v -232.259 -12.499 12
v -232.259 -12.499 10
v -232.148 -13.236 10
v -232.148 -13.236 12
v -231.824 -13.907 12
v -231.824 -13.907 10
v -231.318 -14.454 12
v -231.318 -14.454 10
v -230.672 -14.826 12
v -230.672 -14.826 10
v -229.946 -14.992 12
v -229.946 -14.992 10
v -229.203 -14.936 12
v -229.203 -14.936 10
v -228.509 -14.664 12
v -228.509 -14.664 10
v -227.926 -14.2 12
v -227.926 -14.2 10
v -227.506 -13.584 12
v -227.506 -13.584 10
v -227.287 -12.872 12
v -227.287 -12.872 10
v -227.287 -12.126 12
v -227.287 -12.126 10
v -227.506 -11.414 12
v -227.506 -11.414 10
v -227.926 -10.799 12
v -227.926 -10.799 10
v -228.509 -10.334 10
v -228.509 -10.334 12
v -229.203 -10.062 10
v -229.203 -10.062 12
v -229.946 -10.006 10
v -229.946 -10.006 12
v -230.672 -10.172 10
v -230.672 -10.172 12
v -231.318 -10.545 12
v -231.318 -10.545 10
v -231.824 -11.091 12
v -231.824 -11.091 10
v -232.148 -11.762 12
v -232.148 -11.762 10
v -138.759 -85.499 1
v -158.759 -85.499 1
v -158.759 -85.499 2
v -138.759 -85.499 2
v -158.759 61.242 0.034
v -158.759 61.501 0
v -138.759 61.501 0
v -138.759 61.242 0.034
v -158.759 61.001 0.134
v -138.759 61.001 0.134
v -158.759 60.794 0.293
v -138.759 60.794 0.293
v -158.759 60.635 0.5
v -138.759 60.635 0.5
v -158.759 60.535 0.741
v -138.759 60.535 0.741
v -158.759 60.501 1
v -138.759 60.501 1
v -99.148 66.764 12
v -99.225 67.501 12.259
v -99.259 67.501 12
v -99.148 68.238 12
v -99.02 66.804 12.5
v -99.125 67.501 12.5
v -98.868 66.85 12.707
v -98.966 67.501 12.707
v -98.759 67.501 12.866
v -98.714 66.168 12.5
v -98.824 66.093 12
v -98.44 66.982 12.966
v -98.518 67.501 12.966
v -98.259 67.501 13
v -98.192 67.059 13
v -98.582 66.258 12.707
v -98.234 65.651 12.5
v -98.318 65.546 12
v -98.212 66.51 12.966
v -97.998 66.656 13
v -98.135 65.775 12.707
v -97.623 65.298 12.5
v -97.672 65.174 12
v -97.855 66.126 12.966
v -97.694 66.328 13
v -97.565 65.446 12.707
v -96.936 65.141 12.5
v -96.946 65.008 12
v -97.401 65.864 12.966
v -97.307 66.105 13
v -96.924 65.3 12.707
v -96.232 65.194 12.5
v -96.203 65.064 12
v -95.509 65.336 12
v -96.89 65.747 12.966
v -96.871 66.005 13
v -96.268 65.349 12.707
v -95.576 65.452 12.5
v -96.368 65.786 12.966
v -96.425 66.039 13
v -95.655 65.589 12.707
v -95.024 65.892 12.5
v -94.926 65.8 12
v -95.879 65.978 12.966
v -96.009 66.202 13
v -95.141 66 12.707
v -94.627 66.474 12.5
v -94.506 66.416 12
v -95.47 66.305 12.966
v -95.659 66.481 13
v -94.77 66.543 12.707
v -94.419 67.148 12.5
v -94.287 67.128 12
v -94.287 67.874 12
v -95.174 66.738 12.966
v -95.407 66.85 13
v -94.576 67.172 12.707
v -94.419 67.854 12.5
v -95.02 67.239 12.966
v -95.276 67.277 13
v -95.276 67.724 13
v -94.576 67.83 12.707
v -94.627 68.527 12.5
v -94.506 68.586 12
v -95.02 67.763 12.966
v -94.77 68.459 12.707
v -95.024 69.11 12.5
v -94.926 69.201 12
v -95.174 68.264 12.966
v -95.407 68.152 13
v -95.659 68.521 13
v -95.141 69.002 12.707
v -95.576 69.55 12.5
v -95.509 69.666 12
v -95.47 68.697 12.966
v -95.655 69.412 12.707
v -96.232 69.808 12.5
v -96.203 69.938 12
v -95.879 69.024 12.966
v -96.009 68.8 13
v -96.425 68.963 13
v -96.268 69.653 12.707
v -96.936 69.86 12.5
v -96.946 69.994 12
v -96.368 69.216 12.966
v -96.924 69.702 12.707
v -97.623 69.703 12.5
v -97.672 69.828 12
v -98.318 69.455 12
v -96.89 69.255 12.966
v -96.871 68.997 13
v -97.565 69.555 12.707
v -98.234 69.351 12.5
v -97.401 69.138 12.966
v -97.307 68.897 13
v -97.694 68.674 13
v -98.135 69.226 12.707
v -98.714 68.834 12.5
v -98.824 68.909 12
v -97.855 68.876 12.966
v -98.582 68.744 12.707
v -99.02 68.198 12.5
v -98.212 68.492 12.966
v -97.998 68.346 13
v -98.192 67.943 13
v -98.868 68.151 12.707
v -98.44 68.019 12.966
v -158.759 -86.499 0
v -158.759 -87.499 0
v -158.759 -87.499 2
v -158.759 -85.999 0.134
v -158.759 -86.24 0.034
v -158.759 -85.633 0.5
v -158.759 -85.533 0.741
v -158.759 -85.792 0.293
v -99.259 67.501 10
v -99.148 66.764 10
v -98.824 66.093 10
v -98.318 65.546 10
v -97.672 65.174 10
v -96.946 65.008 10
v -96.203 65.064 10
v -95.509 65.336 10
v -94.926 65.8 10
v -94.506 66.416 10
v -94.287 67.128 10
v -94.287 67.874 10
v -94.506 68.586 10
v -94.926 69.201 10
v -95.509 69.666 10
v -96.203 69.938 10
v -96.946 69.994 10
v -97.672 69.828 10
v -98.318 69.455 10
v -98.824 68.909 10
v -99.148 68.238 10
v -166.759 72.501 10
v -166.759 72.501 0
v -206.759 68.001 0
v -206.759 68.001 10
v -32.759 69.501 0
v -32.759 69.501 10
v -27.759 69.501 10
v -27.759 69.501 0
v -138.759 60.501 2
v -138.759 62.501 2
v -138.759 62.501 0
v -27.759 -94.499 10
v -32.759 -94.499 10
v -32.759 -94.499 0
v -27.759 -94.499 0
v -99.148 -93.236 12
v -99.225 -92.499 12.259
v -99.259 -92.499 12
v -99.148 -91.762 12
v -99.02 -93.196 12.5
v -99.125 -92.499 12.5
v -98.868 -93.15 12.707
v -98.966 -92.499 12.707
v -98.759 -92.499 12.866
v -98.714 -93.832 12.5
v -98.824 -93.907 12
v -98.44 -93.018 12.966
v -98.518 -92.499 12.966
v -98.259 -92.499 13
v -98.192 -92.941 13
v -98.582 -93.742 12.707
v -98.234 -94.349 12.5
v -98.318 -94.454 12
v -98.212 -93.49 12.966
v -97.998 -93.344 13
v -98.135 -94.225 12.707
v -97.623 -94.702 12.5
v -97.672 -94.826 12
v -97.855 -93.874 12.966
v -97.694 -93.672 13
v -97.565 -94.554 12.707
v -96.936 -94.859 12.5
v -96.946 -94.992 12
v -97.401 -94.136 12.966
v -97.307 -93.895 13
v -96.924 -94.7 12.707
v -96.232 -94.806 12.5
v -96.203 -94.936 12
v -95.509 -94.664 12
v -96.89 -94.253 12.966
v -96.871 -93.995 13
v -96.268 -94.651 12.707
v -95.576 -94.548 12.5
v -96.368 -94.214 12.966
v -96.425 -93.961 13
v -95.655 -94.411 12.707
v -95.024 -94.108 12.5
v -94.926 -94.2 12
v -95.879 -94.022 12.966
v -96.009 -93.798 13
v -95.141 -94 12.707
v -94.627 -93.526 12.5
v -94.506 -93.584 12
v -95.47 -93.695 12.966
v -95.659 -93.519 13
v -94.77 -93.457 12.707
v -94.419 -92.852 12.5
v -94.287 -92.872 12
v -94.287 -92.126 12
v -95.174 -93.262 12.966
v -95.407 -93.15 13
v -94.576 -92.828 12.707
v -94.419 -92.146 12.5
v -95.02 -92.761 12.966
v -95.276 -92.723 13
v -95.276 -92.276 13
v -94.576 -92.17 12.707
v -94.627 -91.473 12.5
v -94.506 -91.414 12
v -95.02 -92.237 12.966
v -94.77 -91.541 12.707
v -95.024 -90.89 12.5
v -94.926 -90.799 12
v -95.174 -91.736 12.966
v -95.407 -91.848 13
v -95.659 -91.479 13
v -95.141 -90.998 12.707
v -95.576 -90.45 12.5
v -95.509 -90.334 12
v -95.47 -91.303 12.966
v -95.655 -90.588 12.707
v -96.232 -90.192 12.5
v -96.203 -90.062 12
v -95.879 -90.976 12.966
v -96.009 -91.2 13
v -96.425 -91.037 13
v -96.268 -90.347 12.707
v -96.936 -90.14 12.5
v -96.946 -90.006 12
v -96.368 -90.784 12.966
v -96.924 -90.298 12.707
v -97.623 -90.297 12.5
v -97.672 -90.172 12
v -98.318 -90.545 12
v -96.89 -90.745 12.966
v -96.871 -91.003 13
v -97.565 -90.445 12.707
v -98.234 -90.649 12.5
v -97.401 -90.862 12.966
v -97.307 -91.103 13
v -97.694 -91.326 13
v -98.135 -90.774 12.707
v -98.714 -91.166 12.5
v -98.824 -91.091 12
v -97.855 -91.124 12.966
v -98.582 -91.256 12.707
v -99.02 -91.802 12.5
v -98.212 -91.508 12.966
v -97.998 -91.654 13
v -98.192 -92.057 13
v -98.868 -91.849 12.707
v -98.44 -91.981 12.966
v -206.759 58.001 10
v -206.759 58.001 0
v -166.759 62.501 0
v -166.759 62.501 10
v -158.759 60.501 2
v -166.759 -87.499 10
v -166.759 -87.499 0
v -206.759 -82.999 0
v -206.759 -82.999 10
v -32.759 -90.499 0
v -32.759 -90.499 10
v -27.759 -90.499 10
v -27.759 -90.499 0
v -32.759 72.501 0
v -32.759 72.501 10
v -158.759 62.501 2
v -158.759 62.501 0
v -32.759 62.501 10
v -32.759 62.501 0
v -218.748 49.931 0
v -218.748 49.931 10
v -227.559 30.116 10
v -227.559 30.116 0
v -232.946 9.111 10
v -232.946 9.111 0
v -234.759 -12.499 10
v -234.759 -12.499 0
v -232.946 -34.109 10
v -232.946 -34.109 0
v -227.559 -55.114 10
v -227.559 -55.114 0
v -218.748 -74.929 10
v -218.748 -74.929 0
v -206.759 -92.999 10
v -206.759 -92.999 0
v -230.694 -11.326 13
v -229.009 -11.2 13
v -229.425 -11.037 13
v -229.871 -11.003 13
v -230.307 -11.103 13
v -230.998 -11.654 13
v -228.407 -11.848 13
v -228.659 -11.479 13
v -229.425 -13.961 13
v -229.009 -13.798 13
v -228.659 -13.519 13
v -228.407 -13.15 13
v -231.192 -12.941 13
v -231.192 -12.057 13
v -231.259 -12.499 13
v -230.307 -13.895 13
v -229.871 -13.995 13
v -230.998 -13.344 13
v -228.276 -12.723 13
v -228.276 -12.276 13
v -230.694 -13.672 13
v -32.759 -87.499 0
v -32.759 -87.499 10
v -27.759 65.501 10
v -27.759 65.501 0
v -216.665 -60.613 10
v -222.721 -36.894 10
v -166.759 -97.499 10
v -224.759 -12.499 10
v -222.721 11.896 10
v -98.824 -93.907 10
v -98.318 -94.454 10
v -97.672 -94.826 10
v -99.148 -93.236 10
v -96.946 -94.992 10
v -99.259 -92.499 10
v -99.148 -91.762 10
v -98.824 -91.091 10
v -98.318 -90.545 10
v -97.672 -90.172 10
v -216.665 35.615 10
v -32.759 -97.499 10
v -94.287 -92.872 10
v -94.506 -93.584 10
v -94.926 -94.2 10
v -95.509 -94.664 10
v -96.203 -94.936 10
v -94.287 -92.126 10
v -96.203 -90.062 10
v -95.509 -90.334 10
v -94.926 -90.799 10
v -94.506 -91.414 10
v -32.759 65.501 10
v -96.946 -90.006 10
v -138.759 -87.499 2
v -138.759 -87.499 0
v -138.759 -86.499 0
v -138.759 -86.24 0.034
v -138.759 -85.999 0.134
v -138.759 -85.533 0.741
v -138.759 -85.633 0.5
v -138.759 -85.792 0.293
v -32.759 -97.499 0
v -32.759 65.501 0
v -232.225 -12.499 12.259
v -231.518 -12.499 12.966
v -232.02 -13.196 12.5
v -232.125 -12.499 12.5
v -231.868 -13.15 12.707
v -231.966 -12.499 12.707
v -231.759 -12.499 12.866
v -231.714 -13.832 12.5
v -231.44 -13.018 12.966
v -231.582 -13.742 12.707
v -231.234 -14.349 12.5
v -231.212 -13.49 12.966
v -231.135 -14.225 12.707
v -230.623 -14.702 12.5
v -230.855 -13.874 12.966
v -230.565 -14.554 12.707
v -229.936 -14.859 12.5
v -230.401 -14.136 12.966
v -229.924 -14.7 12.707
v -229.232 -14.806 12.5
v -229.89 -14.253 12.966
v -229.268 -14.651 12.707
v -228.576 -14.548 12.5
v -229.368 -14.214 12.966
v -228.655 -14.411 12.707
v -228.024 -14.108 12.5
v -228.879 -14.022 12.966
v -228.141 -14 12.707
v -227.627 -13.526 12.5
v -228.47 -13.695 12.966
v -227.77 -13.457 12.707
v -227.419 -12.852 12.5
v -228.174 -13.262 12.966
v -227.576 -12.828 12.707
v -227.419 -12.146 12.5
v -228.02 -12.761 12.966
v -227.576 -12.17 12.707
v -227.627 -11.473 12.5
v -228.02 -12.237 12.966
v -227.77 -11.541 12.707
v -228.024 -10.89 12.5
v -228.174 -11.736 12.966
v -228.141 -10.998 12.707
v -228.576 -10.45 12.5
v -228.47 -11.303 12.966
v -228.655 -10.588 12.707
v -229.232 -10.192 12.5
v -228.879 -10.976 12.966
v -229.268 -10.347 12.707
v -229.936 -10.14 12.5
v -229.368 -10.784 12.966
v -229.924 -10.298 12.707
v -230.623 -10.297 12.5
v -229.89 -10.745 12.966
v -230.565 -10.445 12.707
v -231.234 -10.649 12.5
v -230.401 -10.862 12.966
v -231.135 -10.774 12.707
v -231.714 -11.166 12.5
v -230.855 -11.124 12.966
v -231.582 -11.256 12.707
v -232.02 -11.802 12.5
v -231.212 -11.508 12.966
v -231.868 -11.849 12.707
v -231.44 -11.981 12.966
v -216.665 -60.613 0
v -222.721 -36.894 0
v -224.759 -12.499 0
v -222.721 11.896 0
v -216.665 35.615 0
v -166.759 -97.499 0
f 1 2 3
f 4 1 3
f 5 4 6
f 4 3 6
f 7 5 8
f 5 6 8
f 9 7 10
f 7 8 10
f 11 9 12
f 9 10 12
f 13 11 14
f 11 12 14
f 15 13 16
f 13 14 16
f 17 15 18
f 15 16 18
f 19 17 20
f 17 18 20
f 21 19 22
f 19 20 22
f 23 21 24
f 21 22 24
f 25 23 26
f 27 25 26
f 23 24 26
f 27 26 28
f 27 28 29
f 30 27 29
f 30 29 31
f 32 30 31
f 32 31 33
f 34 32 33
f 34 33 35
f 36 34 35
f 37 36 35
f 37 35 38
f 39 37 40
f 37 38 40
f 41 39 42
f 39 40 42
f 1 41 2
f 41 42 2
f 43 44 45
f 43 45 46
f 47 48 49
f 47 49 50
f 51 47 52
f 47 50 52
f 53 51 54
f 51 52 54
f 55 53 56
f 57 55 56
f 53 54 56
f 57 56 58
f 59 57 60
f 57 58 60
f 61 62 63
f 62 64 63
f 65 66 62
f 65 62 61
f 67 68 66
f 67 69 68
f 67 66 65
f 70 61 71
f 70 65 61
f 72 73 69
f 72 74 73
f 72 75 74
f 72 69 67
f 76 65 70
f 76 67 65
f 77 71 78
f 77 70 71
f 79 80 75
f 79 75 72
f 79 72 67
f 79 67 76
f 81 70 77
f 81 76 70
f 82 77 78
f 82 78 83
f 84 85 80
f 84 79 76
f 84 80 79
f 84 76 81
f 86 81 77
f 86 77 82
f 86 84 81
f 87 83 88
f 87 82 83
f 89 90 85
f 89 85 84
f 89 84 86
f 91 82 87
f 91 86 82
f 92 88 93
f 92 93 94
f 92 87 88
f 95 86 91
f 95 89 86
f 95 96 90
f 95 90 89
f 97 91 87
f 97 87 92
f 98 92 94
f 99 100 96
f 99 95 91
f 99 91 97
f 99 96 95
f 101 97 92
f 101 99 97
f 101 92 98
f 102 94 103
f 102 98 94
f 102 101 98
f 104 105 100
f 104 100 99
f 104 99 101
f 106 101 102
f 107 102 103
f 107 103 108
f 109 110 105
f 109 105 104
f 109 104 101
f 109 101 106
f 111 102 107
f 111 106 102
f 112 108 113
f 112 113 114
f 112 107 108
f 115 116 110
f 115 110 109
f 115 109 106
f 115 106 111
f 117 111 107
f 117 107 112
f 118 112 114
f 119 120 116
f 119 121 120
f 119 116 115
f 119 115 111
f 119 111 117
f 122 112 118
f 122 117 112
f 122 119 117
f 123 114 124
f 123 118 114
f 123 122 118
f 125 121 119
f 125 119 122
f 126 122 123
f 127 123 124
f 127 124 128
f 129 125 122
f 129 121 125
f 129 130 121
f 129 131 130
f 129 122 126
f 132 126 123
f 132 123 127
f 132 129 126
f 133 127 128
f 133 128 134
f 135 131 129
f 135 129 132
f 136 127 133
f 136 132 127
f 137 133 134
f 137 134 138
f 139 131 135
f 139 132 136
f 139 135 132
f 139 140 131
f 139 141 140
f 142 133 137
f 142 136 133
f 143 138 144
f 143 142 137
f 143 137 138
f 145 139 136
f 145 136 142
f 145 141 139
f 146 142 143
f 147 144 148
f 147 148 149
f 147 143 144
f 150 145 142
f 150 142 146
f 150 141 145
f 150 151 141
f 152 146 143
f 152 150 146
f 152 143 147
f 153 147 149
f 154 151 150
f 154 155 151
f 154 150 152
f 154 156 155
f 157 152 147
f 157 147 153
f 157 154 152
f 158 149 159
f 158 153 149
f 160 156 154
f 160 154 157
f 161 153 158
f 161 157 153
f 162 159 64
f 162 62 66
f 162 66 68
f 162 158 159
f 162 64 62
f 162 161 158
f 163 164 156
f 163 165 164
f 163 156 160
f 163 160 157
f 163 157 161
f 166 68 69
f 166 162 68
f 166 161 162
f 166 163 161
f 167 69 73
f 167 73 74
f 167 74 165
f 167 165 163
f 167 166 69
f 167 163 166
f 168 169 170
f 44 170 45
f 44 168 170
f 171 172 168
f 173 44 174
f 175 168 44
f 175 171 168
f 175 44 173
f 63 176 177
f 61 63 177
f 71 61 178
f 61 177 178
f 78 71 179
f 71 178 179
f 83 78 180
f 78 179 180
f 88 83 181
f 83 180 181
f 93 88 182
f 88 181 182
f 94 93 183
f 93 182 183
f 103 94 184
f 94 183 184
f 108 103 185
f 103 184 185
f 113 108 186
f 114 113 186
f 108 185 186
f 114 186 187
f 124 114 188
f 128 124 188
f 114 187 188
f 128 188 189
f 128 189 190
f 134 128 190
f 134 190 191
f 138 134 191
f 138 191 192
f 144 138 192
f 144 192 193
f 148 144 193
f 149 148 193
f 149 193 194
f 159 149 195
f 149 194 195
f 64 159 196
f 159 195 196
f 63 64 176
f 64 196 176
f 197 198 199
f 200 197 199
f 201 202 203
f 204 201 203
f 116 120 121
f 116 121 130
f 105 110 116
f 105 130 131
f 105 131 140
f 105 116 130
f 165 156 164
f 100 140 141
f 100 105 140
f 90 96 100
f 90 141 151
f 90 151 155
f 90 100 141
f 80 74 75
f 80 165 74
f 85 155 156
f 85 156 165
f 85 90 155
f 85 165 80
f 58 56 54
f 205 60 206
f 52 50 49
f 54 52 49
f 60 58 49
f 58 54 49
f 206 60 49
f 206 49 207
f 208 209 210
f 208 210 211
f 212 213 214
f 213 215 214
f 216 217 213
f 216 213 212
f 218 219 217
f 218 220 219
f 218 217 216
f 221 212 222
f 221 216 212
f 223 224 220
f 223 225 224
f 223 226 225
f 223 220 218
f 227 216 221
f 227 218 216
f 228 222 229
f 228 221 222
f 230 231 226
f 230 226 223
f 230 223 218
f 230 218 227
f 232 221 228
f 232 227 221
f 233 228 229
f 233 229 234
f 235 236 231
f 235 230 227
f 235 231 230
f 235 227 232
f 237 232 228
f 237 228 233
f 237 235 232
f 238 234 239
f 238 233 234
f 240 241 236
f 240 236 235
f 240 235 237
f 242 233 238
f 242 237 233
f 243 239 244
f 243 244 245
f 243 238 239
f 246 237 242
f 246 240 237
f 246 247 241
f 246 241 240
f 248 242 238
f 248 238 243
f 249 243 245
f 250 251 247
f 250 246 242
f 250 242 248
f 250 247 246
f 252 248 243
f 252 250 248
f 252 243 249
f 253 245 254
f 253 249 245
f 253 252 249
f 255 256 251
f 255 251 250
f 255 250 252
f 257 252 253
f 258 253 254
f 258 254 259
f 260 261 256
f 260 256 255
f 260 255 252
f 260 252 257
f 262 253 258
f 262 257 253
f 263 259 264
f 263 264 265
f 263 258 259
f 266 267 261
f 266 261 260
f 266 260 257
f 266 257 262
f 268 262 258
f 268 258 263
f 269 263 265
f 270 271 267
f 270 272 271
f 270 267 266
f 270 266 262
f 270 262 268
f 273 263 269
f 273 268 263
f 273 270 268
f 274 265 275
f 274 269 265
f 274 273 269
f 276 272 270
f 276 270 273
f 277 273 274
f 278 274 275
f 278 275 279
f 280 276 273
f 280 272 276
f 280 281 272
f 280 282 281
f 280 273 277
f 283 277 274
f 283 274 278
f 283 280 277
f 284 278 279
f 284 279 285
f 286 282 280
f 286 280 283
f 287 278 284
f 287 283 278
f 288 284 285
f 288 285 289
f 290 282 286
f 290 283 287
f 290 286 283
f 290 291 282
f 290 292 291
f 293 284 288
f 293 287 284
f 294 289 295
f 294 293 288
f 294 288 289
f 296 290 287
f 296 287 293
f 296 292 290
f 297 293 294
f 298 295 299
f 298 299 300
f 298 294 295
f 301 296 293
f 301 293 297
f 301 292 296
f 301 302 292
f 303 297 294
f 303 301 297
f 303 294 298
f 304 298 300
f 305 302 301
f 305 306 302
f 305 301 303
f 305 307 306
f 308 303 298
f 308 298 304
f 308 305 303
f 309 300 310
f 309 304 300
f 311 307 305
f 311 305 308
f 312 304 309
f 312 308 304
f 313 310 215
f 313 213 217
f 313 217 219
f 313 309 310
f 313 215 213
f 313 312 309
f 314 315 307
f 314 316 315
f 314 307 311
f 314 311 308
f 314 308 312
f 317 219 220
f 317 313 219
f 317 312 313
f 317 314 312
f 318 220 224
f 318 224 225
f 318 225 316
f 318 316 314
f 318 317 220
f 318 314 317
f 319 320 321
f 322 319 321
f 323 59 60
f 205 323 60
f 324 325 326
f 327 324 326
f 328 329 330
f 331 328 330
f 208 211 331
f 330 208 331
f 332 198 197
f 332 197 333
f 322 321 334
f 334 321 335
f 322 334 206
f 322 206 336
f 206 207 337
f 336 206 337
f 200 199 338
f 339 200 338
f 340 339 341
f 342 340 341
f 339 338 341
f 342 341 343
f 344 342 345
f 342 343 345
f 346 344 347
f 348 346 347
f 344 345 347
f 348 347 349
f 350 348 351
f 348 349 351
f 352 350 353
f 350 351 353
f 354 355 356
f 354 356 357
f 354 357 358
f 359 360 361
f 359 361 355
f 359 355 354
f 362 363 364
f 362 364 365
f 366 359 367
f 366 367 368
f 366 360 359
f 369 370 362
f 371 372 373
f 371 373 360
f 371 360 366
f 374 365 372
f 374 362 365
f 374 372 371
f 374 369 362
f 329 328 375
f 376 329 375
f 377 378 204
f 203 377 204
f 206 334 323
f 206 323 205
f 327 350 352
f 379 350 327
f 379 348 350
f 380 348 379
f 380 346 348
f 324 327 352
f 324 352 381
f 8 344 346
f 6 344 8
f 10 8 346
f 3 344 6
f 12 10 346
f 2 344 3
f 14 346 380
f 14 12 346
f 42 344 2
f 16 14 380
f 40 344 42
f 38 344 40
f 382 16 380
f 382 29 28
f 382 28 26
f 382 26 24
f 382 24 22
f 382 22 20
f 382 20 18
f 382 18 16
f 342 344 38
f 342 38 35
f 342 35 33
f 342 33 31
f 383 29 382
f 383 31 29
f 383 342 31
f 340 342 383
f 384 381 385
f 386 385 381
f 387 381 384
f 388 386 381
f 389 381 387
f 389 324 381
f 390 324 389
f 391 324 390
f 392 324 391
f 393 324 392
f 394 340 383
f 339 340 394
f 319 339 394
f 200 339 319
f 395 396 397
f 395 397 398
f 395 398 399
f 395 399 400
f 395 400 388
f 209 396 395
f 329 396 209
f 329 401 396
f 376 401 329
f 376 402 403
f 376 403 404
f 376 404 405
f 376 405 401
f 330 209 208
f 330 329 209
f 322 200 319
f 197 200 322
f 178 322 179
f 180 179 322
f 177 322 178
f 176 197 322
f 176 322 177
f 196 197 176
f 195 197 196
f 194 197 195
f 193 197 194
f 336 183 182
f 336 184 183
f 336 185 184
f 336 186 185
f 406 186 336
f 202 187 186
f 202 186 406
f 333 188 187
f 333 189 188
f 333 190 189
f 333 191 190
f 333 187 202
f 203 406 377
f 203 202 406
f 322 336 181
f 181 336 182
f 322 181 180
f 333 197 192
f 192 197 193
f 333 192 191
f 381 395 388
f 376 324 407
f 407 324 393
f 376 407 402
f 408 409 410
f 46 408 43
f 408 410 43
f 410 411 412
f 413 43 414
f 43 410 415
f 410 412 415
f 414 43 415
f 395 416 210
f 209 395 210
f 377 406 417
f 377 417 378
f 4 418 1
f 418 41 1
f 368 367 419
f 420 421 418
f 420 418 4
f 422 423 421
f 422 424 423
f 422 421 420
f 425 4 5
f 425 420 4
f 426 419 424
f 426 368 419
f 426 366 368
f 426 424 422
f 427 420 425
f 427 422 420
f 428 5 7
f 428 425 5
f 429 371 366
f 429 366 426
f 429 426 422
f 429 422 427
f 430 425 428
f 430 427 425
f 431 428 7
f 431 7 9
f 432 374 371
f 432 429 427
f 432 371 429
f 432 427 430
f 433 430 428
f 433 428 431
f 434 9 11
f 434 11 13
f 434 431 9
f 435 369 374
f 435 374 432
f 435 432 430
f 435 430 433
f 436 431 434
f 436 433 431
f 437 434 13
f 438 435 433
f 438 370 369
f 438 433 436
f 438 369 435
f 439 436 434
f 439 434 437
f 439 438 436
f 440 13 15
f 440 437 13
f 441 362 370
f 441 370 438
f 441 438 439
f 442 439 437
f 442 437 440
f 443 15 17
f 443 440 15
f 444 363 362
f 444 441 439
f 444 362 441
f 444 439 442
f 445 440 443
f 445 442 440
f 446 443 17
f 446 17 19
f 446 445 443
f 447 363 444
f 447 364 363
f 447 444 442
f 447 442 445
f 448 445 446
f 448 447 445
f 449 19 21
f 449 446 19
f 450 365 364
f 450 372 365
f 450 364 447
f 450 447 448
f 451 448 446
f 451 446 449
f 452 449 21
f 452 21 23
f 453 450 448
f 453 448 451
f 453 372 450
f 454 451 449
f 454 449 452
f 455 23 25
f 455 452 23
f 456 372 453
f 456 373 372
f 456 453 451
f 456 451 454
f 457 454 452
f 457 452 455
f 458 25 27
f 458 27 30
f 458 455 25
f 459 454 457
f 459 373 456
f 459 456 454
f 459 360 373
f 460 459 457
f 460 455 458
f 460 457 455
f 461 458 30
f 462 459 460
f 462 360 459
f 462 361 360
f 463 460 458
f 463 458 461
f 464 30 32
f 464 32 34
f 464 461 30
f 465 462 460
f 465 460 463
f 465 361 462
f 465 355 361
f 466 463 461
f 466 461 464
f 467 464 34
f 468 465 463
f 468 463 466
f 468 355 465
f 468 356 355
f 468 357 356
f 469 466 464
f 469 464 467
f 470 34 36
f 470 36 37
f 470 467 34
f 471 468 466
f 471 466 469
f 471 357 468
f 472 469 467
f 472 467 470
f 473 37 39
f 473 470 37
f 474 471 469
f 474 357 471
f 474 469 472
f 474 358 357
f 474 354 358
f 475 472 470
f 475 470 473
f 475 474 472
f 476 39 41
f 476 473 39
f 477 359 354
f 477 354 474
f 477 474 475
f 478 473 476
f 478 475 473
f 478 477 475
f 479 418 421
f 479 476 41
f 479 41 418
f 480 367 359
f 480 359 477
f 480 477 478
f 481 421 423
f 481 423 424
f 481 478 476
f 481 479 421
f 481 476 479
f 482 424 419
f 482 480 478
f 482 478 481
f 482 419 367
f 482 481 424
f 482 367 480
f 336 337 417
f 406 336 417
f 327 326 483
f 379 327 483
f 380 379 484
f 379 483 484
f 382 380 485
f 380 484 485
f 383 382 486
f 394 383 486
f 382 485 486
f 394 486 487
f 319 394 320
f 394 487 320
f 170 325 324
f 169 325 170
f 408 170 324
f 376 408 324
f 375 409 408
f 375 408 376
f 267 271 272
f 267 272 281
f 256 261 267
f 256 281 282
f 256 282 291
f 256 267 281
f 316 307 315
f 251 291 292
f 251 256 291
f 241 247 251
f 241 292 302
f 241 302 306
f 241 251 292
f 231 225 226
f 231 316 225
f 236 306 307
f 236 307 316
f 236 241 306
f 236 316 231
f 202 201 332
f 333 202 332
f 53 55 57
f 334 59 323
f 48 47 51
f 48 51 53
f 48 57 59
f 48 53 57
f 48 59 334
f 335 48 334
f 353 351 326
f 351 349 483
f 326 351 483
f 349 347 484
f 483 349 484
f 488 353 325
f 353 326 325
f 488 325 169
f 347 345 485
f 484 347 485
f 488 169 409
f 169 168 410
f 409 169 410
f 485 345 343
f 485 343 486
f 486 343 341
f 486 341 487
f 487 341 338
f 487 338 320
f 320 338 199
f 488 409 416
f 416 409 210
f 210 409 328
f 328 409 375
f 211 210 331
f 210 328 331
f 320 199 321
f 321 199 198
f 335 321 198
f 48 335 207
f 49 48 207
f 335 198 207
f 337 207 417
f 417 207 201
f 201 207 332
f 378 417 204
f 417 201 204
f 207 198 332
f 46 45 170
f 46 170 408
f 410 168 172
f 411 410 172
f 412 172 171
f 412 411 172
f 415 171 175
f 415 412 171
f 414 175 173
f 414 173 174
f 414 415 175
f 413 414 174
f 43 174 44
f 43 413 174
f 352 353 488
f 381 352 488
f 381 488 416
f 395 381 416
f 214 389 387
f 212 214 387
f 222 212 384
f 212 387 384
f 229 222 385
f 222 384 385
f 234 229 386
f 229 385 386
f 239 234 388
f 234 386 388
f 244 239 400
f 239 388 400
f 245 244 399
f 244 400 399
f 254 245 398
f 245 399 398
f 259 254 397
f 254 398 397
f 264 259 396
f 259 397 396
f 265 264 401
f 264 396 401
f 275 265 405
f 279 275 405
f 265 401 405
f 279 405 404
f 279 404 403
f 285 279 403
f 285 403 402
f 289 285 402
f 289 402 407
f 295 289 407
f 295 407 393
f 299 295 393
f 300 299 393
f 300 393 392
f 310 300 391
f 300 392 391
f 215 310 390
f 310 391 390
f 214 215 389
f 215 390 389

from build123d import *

# Parameters (mm, degrees)
ESQUISSE1_R        = 2.5
BOSS_EXTRU_1_DEPTH = 10
ESQUISSE1_3_R      = 2.5
BOSS_EXTRU_2_DEPTH = 13
CONG_2_R           = 1
CONG_3_R           = 1
ESQUISSE1_4_W      = 20
ESQUISSE1_4_H      = 2
BOSS_EXTRU_3_DEPTH = 2
CONG_4_R           = 1


with BuildPart() as part:
    # Esquisse1 → Boss.-Extru.1 (new body)
    with BuildSketch(Plane.XY):
        with BuildLine():
            Line((-32.758882294, 72.500907441), (-166.758882294, 72.500907441))
            Line((-166.758882294, 72.500907441), (-206.758882294, 68.000907441))
            ThreePointArc((-206.758882294, 68.000907441), (-234.758882294, -12.499092559), (-206.758882294, -92.999092559))
            Line((-206.758882294, -92.999092559), (-166.758882294, -97.499092559))
            Line((-166.758882294, -97.499092559), (-32.758882294, -97.499092559))
            Line((-32.758882294, -97.499092559), (-32.758882294, -94.499092559))
            Line((-32.758882294, -94.499092559), (-27.758882294, -94.499092559))
            Line((-27.758882294, -94.499092559), (-27.758882294, -90.499092559))
            Line((-27.758882294, -90.499092559), (-32.758882294, -90.499092559))
            Line((-32.758882294, -90.499092559), (-32.758882294, -87.499092559))
            Line((-32.758882294, -87.499092559), (-166.758882294, -87.499092559))
            Line((-166.758882294, -87.499092559), (-206.758882294, -82.999092559))
            ThreePointArc((-206.758882294, -82.999092559), (-224.758882294, -12.499092559), (-206.758882294, 58.000907441))
            Line((-206.758882294, 58.000907441), (-166.758882294, 62.500907441))
            Line((-166.758882294, 62.500907441), (-32.758882294, 62.500907441))
            Line((-32.758882294, 62.500907441), (-32.758882294, 65.500907441))
            Line((-32.758882294, 65.500907441), (-27.758882294, 65.500907441))
            Line((-27.758882294, 65.500907441), (-27.758882294, 69.500907441))
            Line((-27.758882294, 69.500907441), (-32.758882294, 69.500907441))
            Line((-32.758882294, 69.500907441), (-32.758882294, 72.500907441))
        make_face()
        with Locations((-96.758882294, 67.500907441)):
            Circle(ESQUISSE1_R, mode=Mode.SUBTRACT)
        with Locations((-229.758882294, -12.499092559)):
            Circle(ESQUISSE1_R, mode=Mode.SUBTRACT)
        with Locations((-96.758882294, -92.499092559)):
            Circle(ESQUISSE1_R, mode=Mode.SUBTRACT)
    extrude(amount=BOSS_EXTRU_1_DEPTH)

    # Esquisse1<3> → Boss.-Extru.2 (add)
    with BuildSketch(Plane.XY):
        with Locations((-229.758882294, -12.499092559)):
            Circle(ESQUISSE1_3_R)
        with Locations((-96.758882294, 67.500907441)):
            Circle(ESQUISSE1_3_R)
        with Locations((-96.758882294, -92.499092559)):
            Circle(ESQUISSE1_3_R)
    extrude(amount=BOSS_EXTRU_2_DEPTH)

    # Congé2
    cong_2_edges = [part.edges().sort_by_distance(p)[0] for p in [
        (-99.258882294, -92.499092559, 13),
    ]]
    fillet(cong_2_edges, radius=CONG_2_R)

    # Congé3
    cong_3_edges = [part.edges().sort_by_distance(p)[0] for p in [
        (-99.258882294, 67.500907441, 13),
        (-232.258882294, -12.499092559, 13),
    ]]
    fillet(cong_3_edges, radius=CONG_3_R)

    # Esquisse1<4> → Boss.-Extru.3 (add)
    with BuildSketch(Plane.XY):
        with Locations((-148.758882294, 61.500907441)):
            Rectangle(ESQUISSE1_4_W, ESQUISSE1_4_H)
        with Locations((-148.758882294, -86.499092559)):
            Rectangle(ESQUISSE1_4_W, ESQUISSE1_4_H)
    extrude(amount=BOSS_EXTRU_3_DEPTH)

    # Congé4
    cong_4_edges = [part.edges().sort_by_distance(p)[0] for p in [
        (-148.758882294, -85.499092559, 0),
        (-148.758882294, 60.500907441, 0),
    ]]
    fillet(cong_4_edges, radius=CONG_4_R)


solid = part.part
